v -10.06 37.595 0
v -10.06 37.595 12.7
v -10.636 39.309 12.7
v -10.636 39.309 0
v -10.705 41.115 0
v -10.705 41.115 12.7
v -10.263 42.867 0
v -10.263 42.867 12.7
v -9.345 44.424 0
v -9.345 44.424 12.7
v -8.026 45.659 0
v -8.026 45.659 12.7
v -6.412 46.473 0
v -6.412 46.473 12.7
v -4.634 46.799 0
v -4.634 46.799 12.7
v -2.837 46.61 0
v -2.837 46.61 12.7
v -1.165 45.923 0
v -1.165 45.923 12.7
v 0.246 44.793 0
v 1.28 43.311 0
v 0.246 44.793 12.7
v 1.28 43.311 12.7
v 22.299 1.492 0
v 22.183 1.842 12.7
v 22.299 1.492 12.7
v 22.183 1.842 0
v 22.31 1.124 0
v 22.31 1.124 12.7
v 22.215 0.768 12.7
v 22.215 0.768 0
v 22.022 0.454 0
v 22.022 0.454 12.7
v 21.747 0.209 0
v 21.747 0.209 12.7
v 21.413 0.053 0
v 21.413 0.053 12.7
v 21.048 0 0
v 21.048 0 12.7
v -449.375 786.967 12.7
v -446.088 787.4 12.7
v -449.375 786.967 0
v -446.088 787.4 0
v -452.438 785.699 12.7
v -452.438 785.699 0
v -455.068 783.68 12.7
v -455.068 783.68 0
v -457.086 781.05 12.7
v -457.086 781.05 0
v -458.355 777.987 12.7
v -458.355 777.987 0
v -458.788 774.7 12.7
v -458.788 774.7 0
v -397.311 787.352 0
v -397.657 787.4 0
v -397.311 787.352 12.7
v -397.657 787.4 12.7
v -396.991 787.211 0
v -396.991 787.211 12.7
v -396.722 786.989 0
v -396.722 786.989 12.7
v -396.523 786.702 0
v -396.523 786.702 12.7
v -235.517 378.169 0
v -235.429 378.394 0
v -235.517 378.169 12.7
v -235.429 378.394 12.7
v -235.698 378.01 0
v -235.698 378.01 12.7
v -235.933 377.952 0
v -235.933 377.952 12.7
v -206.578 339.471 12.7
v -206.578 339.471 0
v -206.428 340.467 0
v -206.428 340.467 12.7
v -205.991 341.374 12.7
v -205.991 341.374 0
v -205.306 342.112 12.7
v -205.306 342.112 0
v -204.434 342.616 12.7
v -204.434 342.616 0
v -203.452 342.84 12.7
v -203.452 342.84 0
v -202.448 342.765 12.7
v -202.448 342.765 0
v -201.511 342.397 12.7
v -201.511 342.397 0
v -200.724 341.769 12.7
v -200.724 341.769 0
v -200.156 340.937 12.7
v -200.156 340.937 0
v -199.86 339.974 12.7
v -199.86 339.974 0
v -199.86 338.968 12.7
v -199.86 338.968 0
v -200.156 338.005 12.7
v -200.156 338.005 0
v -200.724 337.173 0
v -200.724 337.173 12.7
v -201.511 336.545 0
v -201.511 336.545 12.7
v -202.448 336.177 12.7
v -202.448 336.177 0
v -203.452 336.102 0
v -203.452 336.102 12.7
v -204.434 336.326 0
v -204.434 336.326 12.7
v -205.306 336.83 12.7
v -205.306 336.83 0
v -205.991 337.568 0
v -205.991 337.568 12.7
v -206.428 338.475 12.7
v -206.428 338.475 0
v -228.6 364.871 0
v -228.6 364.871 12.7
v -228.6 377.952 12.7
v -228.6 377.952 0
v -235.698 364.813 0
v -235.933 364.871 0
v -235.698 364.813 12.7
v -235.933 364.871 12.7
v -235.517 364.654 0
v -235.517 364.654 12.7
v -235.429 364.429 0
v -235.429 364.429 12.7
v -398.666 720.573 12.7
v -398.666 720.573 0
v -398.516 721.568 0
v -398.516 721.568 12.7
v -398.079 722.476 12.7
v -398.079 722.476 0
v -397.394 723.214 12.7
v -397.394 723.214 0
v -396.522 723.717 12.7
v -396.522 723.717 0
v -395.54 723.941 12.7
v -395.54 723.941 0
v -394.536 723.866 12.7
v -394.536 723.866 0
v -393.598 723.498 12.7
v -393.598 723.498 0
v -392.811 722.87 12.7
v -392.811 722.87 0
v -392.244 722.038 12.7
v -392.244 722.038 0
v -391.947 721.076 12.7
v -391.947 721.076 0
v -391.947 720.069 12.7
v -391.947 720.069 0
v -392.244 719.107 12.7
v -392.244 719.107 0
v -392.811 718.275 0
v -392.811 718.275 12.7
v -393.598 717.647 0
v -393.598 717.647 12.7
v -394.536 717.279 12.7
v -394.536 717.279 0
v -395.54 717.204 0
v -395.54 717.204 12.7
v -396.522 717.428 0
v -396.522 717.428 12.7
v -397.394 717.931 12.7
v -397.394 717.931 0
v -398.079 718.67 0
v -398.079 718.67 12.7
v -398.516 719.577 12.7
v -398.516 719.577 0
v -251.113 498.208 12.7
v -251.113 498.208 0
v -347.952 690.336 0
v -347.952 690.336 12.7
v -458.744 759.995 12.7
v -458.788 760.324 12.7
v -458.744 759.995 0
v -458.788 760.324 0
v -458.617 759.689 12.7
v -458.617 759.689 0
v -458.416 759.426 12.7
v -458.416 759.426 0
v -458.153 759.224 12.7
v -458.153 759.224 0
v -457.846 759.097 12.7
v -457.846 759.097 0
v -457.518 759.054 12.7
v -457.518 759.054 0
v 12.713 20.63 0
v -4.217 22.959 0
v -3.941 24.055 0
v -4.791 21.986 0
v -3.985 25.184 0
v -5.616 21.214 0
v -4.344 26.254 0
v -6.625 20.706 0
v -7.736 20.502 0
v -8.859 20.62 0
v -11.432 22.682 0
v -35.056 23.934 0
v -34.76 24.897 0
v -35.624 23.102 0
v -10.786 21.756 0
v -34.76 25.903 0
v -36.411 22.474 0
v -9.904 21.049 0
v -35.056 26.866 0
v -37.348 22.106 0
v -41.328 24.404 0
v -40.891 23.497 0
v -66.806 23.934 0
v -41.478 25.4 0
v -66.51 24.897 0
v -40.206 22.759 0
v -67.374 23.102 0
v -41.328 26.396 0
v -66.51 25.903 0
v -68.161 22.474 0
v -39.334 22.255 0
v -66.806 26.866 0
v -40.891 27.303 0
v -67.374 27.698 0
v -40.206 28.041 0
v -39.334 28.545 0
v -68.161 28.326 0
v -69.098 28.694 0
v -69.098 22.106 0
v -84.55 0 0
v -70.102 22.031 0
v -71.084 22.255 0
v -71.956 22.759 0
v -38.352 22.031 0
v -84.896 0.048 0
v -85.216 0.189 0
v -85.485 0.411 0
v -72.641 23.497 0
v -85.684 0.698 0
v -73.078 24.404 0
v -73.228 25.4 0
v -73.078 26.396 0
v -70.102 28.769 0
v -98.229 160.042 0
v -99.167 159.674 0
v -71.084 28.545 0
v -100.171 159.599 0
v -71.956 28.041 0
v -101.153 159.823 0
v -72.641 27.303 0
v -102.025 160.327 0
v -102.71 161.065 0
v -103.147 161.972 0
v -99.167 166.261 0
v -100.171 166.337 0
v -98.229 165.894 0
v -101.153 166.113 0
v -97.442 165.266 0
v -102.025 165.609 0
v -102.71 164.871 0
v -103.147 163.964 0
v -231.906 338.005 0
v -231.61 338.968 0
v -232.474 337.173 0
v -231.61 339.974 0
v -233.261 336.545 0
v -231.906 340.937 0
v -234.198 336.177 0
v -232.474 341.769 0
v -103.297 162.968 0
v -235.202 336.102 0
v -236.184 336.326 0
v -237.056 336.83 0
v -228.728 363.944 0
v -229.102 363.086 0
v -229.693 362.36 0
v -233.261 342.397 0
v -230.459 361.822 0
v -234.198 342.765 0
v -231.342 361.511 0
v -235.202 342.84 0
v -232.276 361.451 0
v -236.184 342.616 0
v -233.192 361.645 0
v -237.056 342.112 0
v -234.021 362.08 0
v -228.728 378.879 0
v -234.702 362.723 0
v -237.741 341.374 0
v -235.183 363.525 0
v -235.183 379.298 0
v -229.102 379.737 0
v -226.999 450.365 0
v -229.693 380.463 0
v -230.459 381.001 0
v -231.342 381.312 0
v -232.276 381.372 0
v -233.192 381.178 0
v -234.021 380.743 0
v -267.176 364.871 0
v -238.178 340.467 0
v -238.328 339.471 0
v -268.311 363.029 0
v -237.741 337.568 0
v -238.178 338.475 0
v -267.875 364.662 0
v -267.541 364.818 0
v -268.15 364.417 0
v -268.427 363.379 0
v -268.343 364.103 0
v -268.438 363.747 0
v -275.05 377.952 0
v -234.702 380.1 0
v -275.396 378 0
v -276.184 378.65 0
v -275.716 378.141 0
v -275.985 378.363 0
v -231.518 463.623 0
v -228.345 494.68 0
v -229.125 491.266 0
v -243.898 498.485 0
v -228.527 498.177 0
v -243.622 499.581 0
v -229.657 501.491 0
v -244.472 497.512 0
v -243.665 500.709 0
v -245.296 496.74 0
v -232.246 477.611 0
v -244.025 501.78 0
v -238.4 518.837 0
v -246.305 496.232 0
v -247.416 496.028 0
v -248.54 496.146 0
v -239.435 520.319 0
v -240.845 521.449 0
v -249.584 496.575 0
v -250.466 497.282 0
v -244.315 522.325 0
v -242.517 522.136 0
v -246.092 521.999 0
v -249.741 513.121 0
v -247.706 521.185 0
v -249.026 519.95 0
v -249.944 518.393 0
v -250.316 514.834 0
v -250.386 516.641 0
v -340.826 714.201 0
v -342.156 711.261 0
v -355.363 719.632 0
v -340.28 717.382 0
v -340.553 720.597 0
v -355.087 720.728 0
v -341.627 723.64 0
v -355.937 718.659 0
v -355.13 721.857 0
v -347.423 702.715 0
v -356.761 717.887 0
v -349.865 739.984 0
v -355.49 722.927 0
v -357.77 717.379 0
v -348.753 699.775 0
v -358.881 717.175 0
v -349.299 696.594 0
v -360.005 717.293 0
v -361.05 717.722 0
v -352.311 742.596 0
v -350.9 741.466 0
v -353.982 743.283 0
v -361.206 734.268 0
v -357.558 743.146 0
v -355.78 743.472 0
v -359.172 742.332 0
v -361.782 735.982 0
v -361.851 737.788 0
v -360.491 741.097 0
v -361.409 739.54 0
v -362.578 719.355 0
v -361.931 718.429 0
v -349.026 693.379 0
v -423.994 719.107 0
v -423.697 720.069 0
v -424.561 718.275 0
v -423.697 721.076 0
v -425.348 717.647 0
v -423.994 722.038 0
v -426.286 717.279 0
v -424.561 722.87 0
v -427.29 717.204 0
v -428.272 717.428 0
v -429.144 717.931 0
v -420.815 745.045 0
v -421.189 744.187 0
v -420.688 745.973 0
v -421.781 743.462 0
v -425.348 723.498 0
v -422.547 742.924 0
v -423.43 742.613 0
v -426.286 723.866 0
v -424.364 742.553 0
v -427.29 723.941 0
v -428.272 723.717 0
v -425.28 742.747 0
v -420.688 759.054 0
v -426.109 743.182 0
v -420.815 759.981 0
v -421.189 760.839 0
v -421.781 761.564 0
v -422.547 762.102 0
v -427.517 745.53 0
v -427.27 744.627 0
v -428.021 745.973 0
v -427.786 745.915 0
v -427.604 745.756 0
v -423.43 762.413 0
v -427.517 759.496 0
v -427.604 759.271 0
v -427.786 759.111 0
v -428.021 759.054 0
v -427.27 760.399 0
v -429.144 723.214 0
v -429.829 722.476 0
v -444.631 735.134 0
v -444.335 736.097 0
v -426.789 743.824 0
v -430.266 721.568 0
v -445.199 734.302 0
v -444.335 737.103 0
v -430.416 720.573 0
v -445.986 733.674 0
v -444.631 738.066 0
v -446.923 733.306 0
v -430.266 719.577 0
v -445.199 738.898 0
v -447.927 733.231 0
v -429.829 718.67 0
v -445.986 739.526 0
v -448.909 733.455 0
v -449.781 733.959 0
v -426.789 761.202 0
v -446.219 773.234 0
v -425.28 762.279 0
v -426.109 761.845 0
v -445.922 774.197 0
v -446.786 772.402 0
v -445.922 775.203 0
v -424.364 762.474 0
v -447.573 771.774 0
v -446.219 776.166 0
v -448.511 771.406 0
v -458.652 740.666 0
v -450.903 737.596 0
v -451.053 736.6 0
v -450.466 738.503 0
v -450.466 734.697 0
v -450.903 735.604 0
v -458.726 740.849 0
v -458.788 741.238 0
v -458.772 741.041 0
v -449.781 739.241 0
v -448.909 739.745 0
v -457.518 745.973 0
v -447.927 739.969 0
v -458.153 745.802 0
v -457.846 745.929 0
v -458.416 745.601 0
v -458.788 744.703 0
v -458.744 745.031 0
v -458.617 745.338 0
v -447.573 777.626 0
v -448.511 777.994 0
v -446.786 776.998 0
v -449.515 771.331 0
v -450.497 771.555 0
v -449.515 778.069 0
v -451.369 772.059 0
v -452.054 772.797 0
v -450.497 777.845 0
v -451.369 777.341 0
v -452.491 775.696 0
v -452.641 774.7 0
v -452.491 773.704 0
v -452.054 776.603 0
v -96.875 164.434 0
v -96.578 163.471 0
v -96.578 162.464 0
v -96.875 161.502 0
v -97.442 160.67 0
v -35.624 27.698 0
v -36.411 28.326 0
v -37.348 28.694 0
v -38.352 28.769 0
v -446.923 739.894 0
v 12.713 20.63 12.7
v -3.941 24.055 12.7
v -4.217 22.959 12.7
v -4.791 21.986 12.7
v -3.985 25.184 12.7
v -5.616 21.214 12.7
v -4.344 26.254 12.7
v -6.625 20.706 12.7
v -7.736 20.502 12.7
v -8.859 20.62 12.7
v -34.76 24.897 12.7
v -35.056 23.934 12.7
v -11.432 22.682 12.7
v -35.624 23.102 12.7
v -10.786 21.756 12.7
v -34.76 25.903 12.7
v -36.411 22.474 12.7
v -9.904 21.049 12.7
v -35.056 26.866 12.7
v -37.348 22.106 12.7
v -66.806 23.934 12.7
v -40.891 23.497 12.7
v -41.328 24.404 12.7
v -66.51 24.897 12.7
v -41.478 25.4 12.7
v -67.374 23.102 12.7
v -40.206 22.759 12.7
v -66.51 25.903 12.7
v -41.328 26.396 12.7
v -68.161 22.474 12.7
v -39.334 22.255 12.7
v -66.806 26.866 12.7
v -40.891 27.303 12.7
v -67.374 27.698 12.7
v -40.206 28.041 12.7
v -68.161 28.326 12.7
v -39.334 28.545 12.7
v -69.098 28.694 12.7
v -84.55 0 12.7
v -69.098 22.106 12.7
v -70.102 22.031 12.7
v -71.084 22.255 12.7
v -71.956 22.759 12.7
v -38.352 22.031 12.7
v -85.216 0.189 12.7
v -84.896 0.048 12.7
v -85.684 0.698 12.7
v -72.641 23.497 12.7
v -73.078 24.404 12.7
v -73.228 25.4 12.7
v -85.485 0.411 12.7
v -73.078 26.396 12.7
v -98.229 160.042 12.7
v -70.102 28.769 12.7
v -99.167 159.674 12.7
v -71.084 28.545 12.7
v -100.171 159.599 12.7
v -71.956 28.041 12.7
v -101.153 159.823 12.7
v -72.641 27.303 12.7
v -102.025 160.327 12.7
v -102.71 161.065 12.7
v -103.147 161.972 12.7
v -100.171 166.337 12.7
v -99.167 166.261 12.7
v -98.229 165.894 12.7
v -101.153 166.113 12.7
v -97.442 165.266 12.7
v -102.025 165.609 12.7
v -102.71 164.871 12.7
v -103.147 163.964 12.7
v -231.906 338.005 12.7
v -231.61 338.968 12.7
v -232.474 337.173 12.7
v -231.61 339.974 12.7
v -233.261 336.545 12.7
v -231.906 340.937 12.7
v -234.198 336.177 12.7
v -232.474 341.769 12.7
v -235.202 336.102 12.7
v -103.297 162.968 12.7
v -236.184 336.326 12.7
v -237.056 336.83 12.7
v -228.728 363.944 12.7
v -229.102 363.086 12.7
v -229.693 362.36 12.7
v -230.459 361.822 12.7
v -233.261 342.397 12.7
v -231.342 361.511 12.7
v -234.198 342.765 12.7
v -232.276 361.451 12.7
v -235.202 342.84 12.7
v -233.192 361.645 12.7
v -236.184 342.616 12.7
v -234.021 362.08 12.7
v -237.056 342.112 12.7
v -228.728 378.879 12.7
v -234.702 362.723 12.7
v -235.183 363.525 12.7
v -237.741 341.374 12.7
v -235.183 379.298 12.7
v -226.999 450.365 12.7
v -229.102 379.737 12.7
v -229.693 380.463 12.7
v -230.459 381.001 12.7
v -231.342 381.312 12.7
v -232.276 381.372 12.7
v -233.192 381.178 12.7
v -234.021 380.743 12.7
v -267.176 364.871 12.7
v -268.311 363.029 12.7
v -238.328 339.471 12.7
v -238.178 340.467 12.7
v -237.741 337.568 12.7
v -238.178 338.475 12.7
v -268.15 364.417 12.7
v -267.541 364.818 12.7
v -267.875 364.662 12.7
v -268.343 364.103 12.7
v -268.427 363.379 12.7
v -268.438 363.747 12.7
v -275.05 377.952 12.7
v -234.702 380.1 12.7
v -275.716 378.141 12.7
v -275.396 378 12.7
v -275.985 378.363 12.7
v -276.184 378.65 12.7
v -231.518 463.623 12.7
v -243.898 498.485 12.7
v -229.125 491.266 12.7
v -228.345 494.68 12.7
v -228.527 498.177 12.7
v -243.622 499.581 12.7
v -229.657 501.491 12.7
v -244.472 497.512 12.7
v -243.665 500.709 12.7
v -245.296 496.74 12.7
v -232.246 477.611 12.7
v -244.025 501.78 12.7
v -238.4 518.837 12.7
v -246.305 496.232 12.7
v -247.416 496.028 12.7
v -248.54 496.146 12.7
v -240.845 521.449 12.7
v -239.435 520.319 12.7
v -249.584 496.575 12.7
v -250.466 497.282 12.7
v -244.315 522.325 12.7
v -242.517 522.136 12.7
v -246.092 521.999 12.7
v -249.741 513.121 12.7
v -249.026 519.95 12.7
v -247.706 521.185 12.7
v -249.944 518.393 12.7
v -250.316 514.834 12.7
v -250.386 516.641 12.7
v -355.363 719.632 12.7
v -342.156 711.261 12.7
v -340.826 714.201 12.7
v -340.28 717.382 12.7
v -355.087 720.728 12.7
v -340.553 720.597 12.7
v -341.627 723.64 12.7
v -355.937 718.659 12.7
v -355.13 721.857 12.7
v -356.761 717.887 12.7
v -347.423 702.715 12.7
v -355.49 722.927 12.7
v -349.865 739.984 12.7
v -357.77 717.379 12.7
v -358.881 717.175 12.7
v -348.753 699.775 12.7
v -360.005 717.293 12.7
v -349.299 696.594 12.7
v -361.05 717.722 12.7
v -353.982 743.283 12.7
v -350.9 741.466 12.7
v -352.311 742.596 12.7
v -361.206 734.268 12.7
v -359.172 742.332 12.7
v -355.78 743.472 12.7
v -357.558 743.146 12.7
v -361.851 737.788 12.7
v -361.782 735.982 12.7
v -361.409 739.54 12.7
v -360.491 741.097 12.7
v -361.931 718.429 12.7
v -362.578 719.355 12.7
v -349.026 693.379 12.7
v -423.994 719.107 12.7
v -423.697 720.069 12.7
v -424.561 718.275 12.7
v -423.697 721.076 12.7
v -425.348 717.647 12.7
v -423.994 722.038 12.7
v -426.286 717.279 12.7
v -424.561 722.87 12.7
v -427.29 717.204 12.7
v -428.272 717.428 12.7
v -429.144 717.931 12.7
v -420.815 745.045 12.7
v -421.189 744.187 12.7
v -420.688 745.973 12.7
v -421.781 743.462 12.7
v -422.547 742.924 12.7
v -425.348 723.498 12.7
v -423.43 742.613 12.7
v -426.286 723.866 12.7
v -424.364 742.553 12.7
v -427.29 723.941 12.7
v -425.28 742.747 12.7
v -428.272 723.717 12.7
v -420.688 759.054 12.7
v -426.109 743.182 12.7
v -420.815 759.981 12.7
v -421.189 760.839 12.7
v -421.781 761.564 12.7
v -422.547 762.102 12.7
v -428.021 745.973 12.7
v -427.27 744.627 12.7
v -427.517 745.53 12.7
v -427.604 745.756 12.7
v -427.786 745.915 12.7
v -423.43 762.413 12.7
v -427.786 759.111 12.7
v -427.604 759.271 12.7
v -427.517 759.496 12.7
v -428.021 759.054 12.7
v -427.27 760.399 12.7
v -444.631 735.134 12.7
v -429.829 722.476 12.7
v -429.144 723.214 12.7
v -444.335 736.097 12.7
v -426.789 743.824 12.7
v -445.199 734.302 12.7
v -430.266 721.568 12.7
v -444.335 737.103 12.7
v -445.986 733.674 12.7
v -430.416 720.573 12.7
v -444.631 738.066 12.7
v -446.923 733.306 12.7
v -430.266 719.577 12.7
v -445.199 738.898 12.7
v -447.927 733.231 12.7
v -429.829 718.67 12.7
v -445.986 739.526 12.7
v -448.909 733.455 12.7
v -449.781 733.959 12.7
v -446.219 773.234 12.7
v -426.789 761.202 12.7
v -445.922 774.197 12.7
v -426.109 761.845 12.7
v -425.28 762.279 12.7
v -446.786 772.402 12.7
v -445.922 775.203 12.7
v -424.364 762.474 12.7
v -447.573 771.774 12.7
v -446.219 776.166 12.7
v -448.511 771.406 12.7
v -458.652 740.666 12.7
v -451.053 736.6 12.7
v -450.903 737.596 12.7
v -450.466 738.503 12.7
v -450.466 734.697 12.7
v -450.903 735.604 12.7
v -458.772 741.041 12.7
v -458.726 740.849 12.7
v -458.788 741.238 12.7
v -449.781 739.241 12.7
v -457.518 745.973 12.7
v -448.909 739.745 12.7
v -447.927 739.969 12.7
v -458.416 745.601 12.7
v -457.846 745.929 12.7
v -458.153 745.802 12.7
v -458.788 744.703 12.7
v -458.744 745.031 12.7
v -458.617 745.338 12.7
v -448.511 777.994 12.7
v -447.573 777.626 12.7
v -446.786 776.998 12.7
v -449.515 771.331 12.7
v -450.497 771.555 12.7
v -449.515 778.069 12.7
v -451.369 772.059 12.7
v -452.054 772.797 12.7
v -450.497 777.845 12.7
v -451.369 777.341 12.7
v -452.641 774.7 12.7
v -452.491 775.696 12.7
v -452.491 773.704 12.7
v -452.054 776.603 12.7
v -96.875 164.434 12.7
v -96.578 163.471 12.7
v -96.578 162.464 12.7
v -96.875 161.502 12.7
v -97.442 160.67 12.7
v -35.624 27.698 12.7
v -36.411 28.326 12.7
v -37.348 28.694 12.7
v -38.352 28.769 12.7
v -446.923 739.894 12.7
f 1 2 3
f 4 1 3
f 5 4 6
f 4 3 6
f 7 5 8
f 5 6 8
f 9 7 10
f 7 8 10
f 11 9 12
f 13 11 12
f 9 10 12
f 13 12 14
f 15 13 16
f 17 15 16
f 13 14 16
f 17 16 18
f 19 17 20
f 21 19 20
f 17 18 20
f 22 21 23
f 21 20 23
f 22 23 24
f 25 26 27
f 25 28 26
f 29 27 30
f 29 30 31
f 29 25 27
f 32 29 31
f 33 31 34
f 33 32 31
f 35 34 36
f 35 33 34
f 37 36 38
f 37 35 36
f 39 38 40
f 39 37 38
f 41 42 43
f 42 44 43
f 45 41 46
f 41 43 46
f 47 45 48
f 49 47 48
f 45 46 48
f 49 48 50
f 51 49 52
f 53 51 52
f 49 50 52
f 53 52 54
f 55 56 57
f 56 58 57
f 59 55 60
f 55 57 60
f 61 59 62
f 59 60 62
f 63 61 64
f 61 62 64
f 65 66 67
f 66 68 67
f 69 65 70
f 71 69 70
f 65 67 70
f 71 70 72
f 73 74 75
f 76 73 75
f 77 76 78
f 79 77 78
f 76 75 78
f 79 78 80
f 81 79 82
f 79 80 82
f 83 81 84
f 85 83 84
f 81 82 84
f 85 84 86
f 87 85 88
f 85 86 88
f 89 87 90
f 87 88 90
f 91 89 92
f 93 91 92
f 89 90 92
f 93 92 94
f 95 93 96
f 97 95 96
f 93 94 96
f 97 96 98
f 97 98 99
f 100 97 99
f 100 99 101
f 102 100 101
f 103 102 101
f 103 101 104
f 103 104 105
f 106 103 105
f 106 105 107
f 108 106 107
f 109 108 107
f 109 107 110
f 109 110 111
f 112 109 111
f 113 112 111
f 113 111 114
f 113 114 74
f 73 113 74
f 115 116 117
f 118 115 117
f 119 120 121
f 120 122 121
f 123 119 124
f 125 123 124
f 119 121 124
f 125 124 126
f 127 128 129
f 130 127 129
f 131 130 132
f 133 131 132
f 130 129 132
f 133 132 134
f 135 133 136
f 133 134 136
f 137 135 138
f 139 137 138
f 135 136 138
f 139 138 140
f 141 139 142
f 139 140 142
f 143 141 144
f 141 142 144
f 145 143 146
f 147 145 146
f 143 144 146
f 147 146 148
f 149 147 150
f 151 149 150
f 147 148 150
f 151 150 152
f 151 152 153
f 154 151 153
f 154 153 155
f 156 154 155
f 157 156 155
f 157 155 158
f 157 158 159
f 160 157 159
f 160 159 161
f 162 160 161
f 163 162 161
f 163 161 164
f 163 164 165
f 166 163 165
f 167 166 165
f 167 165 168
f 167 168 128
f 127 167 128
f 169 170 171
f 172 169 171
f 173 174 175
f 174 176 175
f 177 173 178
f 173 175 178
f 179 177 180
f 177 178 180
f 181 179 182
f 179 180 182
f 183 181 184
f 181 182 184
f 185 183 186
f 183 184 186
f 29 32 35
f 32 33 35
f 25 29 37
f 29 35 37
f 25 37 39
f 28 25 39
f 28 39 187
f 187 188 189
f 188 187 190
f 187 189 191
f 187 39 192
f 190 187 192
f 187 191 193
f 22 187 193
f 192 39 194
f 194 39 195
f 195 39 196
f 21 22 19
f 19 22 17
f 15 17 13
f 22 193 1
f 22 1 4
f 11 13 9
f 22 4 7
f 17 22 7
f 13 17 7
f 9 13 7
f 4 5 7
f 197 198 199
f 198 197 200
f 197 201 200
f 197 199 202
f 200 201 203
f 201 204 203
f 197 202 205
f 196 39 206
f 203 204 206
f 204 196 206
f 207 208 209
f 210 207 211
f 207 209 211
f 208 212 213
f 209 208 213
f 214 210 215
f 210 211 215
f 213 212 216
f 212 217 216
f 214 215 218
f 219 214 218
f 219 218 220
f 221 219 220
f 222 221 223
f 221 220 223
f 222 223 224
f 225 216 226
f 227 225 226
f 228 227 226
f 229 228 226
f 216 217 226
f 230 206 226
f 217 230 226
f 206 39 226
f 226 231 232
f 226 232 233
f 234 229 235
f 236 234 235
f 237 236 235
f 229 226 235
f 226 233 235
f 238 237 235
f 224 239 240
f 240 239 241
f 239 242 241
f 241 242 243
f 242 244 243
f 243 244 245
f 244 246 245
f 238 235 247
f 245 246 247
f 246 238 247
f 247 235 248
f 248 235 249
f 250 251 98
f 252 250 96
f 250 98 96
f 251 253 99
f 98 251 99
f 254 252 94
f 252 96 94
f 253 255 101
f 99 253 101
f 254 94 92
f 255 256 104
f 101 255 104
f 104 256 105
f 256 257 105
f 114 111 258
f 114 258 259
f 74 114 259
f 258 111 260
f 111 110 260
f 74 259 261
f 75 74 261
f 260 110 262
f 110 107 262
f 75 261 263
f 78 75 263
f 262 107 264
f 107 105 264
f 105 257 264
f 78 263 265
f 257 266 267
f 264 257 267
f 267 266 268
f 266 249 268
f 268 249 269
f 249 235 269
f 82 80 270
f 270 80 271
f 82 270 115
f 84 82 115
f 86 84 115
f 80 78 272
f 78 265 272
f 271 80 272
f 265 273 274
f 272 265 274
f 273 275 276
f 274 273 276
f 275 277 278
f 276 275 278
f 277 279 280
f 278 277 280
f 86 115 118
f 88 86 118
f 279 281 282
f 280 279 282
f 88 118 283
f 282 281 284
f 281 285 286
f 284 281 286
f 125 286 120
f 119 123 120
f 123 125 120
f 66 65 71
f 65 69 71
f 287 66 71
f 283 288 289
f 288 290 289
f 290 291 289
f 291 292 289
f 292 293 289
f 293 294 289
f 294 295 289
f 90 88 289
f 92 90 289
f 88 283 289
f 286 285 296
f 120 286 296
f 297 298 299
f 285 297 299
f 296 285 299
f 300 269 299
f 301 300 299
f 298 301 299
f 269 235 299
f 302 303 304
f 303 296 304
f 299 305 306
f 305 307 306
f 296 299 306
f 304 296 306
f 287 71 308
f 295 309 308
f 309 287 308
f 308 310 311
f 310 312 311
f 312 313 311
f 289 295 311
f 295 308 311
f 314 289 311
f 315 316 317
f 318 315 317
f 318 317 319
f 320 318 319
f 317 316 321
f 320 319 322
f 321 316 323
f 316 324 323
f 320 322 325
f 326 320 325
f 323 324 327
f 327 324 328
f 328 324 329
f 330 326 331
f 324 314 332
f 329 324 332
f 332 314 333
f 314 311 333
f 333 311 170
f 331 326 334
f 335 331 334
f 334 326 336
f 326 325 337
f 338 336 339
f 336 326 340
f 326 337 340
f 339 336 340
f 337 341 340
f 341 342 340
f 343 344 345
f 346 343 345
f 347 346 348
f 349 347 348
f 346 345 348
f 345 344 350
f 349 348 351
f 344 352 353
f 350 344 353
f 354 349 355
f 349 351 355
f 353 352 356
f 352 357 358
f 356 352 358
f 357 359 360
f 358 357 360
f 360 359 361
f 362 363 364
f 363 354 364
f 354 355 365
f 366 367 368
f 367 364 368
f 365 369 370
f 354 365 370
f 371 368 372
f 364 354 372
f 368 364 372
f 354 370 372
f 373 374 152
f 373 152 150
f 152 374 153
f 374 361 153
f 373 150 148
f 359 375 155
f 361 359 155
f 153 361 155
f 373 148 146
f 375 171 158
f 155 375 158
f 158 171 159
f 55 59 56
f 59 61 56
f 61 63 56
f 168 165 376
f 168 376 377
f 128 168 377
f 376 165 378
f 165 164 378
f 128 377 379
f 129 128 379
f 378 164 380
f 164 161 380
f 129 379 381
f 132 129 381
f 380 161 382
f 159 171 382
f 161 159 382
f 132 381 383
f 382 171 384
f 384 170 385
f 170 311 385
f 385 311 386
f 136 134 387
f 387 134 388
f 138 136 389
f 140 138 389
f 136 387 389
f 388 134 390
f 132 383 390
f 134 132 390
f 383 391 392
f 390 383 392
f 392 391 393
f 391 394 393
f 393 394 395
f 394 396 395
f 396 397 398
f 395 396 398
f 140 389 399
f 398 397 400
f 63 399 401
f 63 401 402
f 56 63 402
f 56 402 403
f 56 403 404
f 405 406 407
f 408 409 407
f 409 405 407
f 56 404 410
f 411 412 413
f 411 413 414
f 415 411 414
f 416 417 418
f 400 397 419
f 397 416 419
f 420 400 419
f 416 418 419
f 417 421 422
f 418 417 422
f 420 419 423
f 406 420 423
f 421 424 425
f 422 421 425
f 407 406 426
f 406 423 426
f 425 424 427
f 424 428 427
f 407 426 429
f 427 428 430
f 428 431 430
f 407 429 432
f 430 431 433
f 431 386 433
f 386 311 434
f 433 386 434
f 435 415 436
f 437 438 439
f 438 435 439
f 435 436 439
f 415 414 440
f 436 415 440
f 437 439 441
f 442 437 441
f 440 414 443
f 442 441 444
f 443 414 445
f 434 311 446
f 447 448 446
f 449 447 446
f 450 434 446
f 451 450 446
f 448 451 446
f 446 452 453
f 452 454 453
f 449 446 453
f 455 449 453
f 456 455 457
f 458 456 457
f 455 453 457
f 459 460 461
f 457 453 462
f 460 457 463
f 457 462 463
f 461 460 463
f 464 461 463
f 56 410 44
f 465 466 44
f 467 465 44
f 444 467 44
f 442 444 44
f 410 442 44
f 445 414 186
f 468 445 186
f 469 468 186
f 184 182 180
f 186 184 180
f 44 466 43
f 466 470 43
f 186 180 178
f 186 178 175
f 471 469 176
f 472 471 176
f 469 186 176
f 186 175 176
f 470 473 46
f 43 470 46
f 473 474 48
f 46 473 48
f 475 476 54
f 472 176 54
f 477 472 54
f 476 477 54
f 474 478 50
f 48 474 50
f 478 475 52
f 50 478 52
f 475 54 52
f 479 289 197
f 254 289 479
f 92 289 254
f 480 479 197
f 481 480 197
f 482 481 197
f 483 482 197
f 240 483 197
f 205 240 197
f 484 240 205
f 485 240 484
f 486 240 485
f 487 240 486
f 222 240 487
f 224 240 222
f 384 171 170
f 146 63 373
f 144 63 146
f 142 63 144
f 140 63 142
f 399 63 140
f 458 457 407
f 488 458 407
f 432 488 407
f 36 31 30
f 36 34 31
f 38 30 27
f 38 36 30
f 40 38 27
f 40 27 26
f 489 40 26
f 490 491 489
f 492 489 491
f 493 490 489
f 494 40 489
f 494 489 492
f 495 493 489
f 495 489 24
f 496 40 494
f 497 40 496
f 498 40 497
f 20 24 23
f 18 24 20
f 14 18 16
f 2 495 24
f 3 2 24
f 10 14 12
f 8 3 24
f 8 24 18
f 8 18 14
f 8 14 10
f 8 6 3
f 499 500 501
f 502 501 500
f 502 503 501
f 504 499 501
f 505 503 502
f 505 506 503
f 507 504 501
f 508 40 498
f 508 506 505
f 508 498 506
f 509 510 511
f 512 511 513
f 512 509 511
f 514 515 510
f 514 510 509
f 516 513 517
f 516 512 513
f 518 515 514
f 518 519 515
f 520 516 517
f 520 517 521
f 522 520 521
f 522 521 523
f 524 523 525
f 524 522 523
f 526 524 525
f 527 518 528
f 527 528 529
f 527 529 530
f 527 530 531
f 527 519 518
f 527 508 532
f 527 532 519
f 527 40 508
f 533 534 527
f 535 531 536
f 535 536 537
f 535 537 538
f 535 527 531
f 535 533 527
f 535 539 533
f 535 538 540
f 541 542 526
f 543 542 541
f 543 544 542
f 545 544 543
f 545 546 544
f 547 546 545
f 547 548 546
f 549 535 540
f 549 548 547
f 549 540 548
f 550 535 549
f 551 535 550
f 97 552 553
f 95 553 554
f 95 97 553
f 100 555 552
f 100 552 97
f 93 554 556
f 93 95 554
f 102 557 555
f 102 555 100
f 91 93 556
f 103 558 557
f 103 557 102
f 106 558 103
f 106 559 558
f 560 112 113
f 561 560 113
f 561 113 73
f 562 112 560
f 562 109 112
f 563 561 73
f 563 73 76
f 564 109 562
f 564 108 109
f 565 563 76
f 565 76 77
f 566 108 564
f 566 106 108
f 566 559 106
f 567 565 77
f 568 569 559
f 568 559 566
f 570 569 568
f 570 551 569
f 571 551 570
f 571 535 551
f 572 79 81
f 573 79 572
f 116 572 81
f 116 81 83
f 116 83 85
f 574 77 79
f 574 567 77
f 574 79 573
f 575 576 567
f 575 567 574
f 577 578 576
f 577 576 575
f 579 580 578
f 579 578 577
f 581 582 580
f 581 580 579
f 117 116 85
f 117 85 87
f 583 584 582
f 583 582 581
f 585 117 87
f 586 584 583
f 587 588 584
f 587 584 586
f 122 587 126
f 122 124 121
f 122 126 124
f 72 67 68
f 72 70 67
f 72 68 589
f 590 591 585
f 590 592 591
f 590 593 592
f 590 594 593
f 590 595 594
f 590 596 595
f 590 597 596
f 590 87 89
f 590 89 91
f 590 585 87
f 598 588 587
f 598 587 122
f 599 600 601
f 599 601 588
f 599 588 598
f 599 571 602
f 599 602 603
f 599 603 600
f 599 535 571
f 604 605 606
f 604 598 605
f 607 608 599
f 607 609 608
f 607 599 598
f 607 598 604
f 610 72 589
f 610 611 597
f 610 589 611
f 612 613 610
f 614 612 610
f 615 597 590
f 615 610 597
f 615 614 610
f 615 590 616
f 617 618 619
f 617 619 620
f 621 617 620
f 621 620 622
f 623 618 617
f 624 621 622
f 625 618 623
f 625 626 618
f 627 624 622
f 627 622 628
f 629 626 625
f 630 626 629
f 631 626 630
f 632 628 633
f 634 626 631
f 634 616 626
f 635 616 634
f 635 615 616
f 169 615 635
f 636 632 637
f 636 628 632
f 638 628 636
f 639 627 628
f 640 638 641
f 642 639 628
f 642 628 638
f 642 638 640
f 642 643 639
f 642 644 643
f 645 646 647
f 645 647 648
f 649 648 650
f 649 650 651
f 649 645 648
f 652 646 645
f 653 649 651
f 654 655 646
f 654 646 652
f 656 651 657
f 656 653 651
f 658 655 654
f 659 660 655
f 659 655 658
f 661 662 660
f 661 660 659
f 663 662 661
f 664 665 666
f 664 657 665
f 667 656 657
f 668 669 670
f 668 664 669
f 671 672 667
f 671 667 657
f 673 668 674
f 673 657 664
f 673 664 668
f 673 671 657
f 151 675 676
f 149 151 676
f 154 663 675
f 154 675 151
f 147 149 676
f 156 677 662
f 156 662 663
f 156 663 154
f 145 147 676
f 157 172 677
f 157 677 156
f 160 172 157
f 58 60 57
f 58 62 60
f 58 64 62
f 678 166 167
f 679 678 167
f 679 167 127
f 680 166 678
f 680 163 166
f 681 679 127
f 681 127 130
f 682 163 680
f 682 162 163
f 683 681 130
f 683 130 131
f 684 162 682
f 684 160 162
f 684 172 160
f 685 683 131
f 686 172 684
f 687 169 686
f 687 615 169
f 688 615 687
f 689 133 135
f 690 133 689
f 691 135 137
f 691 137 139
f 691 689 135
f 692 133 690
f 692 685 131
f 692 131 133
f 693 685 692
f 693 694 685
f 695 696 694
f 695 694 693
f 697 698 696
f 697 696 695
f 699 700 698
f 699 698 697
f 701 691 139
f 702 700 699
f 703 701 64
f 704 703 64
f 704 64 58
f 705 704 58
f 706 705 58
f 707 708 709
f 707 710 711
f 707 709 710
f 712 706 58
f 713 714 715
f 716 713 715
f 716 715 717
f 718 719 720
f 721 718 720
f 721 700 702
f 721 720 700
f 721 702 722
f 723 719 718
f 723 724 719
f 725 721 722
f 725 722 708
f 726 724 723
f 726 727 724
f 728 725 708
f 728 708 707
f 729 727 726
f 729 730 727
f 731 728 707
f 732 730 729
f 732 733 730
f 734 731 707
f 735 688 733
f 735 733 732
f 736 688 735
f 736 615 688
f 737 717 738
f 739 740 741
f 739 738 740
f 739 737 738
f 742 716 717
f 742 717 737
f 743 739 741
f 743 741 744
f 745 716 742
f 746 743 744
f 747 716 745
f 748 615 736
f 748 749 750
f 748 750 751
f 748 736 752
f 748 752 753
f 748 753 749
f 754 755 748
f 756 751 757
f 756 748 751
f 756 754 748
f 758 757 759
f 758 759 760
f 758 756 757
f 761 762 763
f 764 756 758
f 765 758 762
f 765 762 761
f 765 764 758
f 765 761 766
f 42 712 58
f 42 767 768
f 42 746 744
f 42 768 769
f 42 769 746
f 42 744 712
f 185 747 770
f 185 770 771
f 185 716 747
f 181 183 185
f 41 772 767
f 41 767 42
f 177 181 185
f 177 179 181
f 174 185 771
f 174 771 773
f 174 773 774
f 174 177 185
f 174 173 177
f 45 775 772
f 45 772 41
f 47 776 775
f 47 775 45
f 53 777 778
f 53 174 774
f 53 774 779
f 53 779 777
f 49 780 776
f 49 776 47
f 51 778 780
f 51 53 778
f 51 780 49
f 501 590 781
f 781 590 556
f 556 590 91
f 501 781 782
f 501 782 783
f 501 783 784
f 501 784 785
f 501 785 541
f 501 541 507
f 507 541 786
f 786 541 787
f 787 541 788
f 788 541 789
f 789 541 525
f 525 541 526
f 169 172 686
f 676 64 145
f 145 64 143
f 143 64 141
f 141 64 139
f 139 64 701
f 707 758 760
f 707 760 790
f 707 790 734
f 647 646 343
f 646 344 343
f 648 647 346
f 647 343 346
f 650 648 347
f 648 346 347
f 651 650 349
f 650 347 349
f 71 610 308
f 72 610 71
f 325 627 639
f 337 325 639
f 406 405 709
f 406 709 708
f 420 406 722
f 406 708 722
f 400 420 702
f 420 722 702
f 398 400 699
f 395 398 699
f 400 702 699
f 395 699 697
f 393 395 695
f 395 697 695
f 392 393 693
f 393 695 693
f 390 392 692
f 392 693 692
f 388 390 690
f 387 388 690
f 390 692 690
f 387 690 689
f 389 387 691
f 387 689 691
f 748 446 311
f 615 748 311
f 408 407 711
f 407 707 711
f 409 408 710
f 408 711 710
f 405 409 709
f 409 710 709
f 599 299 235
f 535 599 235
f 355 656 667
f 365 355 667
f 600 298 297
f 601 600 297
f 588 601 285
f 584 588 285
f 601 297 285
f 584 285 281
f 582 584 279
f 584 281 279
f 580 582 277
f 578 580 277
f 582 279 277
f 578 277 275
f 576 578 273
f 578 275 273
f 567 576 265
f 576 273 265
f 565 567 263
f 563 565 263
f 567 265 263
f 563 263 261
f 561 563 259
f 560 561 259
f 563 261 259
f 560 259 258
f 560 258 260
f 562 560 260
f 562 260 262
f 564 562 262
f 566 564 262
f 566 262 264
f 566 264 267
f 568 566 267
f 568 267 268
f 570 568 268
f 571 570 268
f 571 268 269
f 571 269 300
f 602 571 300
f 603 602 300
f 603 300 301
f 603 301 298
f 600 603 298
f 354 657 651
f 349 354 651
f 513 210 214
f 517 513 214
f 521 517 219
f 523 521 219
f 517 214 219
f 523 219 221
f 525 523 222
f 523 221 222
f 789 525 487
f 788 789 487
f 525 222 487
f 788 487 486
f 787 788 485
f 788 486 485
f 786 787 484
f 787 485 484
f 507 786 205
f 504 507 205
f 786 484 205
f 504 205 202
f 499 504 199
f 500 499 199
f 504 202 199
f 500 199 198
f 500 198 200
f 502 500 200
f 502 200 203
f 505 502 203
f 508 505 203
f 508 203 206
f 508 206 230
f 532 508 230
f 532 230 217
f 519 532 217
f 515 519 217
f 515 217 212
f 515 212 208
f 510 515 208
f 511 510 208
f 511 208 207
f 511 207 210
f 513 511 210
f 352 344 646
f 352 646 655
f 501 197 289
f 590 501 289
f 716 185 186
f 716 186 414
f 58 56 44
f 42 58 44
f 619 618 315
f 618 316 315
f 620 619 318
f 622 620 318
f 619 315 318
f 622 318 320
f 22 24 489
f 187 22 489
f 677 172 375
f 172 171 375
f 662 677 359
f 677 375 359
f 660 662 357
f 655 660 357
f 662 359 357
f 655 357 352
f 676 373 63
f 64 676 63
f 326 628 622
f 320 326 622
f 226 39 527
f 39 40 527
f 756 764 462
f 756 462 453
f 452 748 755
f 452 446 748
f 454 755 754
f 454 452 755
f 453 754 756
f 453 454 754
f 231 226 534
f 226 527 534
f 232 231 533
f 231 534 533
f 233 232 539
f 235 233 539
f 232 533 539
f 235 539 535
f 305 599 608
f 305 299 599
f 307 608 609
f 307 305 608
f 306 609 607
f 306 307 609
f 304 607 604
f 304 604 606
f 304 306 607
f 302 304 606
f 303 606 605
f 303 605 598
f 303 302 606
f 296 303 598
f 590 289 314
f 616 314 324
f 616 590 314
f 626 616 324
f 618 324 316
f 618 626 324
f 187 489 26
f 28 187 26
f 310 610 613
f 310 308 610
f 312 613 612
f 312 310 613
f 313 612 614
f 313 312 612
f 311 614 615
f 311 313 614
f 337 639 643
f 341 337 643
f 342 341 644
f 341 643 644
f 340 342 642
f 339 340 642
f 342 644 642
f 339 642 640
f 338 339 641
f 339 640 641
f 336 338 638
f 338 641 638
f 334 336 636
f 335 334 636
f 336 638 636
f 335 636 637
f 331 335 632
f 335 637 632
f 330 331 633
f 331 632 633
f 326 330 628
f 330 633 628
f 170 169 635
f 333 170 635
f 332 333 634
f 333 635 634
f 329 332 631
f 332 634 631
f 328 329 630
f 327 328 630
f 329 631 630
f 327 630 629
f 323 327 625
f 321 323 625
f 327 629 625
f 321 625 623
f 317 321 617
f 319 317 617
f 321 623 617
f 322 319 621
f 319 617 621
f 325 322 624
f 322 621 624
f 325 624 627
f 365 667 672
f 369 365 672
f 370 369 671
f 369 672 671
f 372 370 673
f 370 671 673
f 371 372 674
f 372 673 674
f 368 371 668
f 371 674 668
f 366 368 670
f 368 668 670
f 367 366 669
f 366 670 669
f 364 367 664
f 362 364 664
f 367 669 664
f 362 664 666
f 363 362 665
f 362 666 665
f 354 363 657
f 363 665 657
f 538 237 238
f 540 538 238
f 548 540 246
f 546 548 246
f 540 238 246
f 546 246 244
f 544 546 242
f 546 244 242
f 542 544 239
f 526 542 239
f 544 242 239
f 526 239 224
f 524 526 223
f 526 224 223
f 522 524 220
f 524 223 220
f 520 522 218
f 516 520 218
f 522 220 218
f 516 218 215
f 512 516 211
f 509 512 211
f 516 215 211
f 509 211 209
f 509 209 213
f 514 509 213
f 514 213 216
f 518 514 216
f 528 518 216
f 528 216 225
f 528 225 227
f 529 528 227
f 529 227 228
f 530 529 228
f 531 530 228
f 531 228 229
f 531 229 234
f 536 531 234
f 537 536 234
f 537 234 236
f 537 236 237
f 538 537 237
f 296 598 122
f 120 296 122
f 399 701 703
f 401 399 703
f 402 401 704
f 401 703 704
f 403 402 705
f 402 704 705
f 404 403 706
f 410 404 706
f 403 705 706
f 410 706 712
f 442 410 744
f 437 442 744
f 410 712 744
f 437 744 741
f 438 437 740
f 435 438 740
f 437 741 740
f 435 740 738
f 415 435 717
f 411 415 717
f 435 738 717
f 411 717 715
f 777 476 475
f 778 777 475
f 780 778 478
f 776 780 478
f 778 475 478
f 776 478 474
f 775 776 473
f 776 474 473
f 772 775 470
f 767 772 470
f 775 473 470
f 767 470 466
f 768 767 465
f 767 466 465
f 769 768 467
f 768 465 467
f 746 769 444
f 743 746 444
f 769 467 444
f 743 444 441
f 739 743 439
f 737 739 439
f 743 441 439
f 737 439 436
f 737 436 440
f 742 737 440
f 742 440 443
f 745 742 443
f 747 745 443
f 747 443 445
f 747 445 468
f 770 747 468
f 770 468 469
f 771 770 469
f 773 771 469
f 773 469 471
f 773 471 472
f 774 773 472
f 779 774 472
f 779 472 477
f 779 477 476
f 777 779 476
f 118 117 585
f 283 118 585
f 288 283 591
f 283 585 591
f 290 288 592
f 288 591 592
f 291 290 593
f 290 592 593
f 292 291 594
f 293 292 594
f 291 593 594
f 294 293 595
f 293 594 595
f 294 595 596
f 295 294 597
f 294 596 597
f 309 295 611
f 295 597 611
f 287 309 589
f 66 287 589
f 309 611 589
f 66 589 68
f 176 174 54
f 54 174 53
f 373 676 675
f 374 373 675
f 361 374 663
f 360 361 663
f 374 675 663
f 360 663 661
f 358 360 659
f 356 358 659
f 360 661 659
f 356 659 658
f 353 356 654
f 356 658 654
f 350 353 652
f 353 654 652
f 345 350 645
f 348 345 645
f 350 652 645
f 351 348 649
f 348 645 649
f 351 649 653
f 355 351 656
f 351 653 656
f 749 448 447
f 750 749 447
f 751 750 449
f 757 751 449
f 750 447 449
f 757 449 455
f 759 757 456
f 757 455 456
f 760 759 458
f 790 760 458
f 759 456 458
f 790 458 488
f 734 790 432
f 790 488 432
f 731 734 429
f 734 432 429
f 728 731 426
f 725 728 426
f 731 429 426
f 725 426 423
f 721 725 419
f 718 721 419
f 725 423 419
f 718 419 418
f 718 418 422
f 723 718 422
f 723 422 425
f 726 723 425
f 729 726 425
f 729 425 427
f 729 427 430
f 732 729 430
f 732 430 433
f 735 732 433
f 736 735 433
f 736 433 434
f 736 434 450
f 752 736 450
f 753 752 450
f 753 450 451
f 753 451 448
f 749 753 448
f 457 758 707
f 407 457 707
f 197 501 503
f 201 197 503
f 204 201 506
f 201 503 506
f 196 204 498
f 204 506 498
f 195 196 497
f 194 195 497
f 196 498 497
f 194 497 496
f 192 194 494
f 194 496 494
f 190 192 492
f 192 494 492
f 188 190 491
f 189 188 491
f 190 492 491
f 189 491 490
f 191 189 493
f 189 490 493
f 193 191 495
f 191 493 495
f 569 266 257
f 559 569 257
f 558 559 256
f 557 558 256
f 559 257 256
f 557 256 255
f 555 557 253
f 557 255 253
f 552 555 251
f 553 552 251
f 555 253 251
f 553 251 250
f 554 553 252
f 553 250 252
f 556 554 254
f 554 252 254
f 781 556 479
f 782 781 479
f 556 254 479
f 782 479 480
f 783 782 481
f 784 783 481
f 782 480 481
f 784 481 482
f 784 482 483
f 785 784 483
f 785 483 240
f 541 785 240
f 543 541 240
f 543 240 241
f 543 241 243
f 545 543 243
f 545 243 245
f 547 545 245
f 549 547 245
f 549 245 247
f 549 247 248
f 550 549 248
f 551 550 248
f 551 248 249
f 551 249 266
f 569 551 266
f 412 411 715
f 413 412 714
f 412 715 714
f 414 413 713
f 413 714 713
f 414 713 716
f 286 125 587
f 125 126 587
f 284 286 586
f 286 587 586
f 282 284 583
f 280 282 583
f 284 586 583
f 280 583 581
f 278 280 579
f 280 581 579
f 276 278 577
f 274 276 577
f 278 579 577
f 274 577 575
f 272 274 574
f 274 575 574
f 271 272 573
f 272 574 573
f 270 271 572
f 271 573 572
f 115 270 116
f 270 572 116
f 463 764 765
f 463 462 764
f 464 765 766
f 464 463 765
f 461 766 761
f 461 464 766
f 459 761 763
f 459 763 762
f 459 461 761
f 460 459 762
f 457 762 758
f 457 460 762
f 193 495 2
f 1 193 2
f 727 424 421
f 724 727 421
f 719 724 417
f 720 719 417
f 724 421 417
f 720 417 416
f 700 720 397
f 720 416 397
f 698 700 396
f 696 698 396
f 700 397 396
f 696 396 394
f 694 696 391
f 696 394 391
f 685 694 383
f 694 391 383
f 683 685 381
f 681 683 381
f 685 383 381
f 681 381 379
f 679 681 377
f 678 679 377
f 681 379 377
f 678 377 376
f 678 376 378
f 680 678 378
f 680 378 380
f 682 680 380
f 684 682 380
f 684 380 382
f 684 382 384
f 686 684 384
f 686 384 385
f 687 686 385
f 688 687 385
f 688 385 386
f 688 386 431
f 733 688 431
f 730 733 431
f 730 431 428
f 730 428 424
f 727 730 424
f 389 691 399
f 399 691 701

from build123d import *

# Parameters (mm, degrees)
BOSS_EXTRUDE1_DEPTH     = 12.7
SKETCH3_W               = 47.23204247
SKETCH3_H               = 13.081
CUT_EXTRUDE1_DEPTH      = 924.408729549
BOSS_EXTRUDE3_DEPTH     = 12.7
F_1_4_CLEARANCE_HOLE1_D = 6.7564
SKETCH13_W              = 23.41954247
SKETCH13_H              = 28.3464
CUT_EXTRUDE2_DEPTH      = 924.408729549
SKETCH14_R              = 3.429
CUT_EXTRUDE3_DEPTH      = 913.678476707
FILLET4_R               = 50.8
FILLET5_R               = 12.7
FILLET6_R               = 1.27
FILLET7_R               = 0.508
F_1_4_CLEARANCE_HOLE2_D = 6.7564
CUT_EXTRUDE4_DEPTH      = 913.678476707
FILLET8_R               = 1.27


with BuildPart() as part:
    # Sketch1 → Boss-Extrude1 (new body)
    with BuildSketch(Plane.XY):
        Polygon((0, 0), (-396.875, 787.4), (-482.20704247, 787.4), (-85.33204247, 0), align=None)
    extrude(amount=BOSS_EXTRUDE1_DEPTH)

    # Sketch3 → Cut-Extrude1 (cut, through all)
    with BuildSketch(Plane.XY.offset(12.7)):
        with Locations((-252.216021235, 371.4115)):
            Rectangle(SKETCH3_W, SKETCH3_H)
        with Locations((-444.303521235, 752.5131)):
            Rectangle(SKETCH3_W, SKETCH3_H)
    extrude(amount=-CUT_EXTRUDE1_DEPTH, mode=Mode.SUBTRACT)

    # Sketch10 → Boss-Extrude3 (add)
    with BuildSketch(Plane.XY.offset(12.7)):
        with BuildLine():
            Line((-244.024703128, 501.780299783), (-249.740869802, 513.121174464))
            ThreePointArc((-249.740869802, 513.121174464), (-246.928515798, 521.649695143), (-238.39999512, 518.837341139))
            Line((-238.39999512, 518.837341139), (-226.967661771, 496.155591775))
            Line((-226.967661771, 496.155591775), (-239.680416455, 475.525946247))
            Line((-239.680416455, 475.525946247), (-251.112749804, 498.207695611))
            ThreePointArc((-251.112749804, 498.207695611), (-245.78242438, 496.449974359), (-244.024703128, 501.780299783))
        make_face()
        with BuildLine():
            Line((-351.145666605, 696.673002545), (-362.577999954, 719.354751908))
            ThreePointArc((-362.577999954, 719.354751908), (-357.24767453, 717.597030656), (-355.489953278, 722.92735608))
            Line((-355.489953278, 722.92735608), (-361.206119952, 734.268230762))
            ThreePointArc((-361.206119952, 734.268230762), (-358.393765948, 742.79675144), (-349.86524527, 739.984397436))
            Line((-349.86524527, 739.984397436), (-338.432911921, 717.302648072))
            Line((-338.432911921, 717.302648072), (-351.145666605, 696.673002545))
        make_face()
        with BuildLine():
            Line((0, 0), (-11.432333349, 22.681749364))
            ThreePointArc((-11.432333349, 22.681749364), (-6.102007925, 20.924028111), (-4.344286673, 26.254353535))
            Line((-4.344286673, 26.254353535), (-10.060453347, 37.595228217))
            ThreePointArc((-10.060453347, 37.595228217), (-7.248099343, 46.123748895), (1.280421335, 43.311394892))
            Line((1.280421335, 43.311394892), (12.712754684, 20.629645528))
            Line((12.712754684, 20.629645528), (23.110761502, 0))
            Line((23.110761502, 0), (0, 0))
        make_face()
    extrude(amount=-BOSS_EXTRUDE3_DEPTH)

    # 1/4 Clearance Hole1 (through all)
    with Locations(Plane.XY.offset(12.7)):
        with Locations((-99.918593468, 162.967911886), (-427.0375, 720.5726), (-395.2875, 720.5726), (-203.2, 339.471), (-234.95, 339.471), (-69.85, 25.4), (-38.1, 25.4)):
            Hole(F_1_4_CLEARANCE_HOLE1_D / 2)

    # Sketch13 → Cut-Extrude2 (cut, through all)
    with BuildSketch(Plane.XY.offset(12.7)):
        with Locations((-470.497271235, 773.2268)):
            Rectangle(SKETCH13_W, SKETCH13_H)
    extrude(amount=-CUT_EXTRUDE2_DEPTH, mode=Mode.SUBTRACT)

    # Sketch14 → Cut-Extrude3 (cut, through all)
    with BuildSketch(Plane.XY.offset(12.7)):
        with Locations((-424.1165, 759.0536)):
            Circle(SKETCH14_R)
        with Locations((-424.1165, 745.9726)):
            Circle(SKETCH14_R)
        with Locations((-232.029, 377.952)):
            Circle(SKETCH14_R)
        with Locations((-232.029, 364.871)):
            Circle(SKETCH14_R)
    extrude(amount=-CUT_EXTRUDE3_DEPTH, mode=Mode.SUBTRACT)

    # Fillet4
    # the kernel refuses this fillet: 50.8 mm, written as the material it adds along each edge
    with BuildSketch(Plane(origin=(-239.680416455, 475.525946247, 12.7), x_dir=(0.45009186412240076, -0.8929822584188458, 0), z_dir=(0, 0, -1))) as fillet4_piece_1:
        with BuildLine():
            CenterArc((28.176198377, -50.8), FILLET4_R, 90, 53.576426358)
            Line((-12.7, -20.6375), (-13.517523968, -20.03425))
            ThreePointArc((-13.517523968, -20.03425), (-7.21528485, -9.786267016), (-0.86528485, 0.532482984))
            Line((-0.86528485, 0.532482984), (0, 1.016))
            Line((0, 1.016), (28.176198377, 1.016))
            Line((28.176198377, 1.016), (28.176198377, 0))
        make_face()
    extrude(amount=12.7)

    # Fillet5
    fillet5_edges = [part.edges().sort_by_distance(p)[0] for p in [
        (-458.7875, 787.4, 6.35),
        (-226.967661771, 496.155591775, 6.35),
        (-338.432911921, 717.302648072, 6.35),
        (-351.145666605, 696.673002545, 6.35),
    ]]
    fillet(fillet5_edges, radius=FILLET5_R)

    # Fillet6
    fillet6_edges = [part.edges().sort_by_distance(p)[0] for p in [
        (-458.7875, 759.0536, 6.35),
        (-269.238796502, 364.871, 6.35),
        (-275.83204247, 377.952, 6.35),
    ]]
    fillet(fillet6_edges, radius=FILLET6_R)

    # Fillet7
    fillet7_edges = [part.edges().sort_by_distance(p)[0] for p in [
        (-235.458, 377.952, 6.35),
        (-427.5455, 759.0536, 6.35),
        (-427.5455, 745.9726, 6.35),
        (-235.458, 364.871, 6.35),
    ]]
    fillet(fillet7_edges, radius=FILLET7_R)

    # 1/4 Clearance Hole2 (through all)
    with Locations(Plane.XY.offset(12.7)):
        with Locations((-447.675, 736.6), (-449.2625, 774.7)):
            Hole(F_1_4_CLEARANCE_HOLE2_D / 2)

    # Sketch18 → Cut-Extrude4 (cut, through all)
    with BuildSketch(Plane.XY.offset(12.7)):
        Polygon((-458.7875, 745.9726), (-458.7875, 740.93562774), (-461.326296502, 745.9726), align=None)
    extrude(amount=-CUT_EXTRUDE4_DEPTH, mode=Mode.SUBTRACT)

    # Fillet8
    fillet8_edges = [part.edges().sort_by_distance(p)[0] for p in [
        (-458.7875, 745.9726, 6.35),
        (-458.7875, 740.93562774, 6.35),
        (-85.33204247, 0, 6.35),
        (23.110761502, 0, 6.35),
        (-396.875, 787.4, 6.35),
    ]]
    fillet(fillet8_edges, radius=FILLET8_R)


solid = part.part
